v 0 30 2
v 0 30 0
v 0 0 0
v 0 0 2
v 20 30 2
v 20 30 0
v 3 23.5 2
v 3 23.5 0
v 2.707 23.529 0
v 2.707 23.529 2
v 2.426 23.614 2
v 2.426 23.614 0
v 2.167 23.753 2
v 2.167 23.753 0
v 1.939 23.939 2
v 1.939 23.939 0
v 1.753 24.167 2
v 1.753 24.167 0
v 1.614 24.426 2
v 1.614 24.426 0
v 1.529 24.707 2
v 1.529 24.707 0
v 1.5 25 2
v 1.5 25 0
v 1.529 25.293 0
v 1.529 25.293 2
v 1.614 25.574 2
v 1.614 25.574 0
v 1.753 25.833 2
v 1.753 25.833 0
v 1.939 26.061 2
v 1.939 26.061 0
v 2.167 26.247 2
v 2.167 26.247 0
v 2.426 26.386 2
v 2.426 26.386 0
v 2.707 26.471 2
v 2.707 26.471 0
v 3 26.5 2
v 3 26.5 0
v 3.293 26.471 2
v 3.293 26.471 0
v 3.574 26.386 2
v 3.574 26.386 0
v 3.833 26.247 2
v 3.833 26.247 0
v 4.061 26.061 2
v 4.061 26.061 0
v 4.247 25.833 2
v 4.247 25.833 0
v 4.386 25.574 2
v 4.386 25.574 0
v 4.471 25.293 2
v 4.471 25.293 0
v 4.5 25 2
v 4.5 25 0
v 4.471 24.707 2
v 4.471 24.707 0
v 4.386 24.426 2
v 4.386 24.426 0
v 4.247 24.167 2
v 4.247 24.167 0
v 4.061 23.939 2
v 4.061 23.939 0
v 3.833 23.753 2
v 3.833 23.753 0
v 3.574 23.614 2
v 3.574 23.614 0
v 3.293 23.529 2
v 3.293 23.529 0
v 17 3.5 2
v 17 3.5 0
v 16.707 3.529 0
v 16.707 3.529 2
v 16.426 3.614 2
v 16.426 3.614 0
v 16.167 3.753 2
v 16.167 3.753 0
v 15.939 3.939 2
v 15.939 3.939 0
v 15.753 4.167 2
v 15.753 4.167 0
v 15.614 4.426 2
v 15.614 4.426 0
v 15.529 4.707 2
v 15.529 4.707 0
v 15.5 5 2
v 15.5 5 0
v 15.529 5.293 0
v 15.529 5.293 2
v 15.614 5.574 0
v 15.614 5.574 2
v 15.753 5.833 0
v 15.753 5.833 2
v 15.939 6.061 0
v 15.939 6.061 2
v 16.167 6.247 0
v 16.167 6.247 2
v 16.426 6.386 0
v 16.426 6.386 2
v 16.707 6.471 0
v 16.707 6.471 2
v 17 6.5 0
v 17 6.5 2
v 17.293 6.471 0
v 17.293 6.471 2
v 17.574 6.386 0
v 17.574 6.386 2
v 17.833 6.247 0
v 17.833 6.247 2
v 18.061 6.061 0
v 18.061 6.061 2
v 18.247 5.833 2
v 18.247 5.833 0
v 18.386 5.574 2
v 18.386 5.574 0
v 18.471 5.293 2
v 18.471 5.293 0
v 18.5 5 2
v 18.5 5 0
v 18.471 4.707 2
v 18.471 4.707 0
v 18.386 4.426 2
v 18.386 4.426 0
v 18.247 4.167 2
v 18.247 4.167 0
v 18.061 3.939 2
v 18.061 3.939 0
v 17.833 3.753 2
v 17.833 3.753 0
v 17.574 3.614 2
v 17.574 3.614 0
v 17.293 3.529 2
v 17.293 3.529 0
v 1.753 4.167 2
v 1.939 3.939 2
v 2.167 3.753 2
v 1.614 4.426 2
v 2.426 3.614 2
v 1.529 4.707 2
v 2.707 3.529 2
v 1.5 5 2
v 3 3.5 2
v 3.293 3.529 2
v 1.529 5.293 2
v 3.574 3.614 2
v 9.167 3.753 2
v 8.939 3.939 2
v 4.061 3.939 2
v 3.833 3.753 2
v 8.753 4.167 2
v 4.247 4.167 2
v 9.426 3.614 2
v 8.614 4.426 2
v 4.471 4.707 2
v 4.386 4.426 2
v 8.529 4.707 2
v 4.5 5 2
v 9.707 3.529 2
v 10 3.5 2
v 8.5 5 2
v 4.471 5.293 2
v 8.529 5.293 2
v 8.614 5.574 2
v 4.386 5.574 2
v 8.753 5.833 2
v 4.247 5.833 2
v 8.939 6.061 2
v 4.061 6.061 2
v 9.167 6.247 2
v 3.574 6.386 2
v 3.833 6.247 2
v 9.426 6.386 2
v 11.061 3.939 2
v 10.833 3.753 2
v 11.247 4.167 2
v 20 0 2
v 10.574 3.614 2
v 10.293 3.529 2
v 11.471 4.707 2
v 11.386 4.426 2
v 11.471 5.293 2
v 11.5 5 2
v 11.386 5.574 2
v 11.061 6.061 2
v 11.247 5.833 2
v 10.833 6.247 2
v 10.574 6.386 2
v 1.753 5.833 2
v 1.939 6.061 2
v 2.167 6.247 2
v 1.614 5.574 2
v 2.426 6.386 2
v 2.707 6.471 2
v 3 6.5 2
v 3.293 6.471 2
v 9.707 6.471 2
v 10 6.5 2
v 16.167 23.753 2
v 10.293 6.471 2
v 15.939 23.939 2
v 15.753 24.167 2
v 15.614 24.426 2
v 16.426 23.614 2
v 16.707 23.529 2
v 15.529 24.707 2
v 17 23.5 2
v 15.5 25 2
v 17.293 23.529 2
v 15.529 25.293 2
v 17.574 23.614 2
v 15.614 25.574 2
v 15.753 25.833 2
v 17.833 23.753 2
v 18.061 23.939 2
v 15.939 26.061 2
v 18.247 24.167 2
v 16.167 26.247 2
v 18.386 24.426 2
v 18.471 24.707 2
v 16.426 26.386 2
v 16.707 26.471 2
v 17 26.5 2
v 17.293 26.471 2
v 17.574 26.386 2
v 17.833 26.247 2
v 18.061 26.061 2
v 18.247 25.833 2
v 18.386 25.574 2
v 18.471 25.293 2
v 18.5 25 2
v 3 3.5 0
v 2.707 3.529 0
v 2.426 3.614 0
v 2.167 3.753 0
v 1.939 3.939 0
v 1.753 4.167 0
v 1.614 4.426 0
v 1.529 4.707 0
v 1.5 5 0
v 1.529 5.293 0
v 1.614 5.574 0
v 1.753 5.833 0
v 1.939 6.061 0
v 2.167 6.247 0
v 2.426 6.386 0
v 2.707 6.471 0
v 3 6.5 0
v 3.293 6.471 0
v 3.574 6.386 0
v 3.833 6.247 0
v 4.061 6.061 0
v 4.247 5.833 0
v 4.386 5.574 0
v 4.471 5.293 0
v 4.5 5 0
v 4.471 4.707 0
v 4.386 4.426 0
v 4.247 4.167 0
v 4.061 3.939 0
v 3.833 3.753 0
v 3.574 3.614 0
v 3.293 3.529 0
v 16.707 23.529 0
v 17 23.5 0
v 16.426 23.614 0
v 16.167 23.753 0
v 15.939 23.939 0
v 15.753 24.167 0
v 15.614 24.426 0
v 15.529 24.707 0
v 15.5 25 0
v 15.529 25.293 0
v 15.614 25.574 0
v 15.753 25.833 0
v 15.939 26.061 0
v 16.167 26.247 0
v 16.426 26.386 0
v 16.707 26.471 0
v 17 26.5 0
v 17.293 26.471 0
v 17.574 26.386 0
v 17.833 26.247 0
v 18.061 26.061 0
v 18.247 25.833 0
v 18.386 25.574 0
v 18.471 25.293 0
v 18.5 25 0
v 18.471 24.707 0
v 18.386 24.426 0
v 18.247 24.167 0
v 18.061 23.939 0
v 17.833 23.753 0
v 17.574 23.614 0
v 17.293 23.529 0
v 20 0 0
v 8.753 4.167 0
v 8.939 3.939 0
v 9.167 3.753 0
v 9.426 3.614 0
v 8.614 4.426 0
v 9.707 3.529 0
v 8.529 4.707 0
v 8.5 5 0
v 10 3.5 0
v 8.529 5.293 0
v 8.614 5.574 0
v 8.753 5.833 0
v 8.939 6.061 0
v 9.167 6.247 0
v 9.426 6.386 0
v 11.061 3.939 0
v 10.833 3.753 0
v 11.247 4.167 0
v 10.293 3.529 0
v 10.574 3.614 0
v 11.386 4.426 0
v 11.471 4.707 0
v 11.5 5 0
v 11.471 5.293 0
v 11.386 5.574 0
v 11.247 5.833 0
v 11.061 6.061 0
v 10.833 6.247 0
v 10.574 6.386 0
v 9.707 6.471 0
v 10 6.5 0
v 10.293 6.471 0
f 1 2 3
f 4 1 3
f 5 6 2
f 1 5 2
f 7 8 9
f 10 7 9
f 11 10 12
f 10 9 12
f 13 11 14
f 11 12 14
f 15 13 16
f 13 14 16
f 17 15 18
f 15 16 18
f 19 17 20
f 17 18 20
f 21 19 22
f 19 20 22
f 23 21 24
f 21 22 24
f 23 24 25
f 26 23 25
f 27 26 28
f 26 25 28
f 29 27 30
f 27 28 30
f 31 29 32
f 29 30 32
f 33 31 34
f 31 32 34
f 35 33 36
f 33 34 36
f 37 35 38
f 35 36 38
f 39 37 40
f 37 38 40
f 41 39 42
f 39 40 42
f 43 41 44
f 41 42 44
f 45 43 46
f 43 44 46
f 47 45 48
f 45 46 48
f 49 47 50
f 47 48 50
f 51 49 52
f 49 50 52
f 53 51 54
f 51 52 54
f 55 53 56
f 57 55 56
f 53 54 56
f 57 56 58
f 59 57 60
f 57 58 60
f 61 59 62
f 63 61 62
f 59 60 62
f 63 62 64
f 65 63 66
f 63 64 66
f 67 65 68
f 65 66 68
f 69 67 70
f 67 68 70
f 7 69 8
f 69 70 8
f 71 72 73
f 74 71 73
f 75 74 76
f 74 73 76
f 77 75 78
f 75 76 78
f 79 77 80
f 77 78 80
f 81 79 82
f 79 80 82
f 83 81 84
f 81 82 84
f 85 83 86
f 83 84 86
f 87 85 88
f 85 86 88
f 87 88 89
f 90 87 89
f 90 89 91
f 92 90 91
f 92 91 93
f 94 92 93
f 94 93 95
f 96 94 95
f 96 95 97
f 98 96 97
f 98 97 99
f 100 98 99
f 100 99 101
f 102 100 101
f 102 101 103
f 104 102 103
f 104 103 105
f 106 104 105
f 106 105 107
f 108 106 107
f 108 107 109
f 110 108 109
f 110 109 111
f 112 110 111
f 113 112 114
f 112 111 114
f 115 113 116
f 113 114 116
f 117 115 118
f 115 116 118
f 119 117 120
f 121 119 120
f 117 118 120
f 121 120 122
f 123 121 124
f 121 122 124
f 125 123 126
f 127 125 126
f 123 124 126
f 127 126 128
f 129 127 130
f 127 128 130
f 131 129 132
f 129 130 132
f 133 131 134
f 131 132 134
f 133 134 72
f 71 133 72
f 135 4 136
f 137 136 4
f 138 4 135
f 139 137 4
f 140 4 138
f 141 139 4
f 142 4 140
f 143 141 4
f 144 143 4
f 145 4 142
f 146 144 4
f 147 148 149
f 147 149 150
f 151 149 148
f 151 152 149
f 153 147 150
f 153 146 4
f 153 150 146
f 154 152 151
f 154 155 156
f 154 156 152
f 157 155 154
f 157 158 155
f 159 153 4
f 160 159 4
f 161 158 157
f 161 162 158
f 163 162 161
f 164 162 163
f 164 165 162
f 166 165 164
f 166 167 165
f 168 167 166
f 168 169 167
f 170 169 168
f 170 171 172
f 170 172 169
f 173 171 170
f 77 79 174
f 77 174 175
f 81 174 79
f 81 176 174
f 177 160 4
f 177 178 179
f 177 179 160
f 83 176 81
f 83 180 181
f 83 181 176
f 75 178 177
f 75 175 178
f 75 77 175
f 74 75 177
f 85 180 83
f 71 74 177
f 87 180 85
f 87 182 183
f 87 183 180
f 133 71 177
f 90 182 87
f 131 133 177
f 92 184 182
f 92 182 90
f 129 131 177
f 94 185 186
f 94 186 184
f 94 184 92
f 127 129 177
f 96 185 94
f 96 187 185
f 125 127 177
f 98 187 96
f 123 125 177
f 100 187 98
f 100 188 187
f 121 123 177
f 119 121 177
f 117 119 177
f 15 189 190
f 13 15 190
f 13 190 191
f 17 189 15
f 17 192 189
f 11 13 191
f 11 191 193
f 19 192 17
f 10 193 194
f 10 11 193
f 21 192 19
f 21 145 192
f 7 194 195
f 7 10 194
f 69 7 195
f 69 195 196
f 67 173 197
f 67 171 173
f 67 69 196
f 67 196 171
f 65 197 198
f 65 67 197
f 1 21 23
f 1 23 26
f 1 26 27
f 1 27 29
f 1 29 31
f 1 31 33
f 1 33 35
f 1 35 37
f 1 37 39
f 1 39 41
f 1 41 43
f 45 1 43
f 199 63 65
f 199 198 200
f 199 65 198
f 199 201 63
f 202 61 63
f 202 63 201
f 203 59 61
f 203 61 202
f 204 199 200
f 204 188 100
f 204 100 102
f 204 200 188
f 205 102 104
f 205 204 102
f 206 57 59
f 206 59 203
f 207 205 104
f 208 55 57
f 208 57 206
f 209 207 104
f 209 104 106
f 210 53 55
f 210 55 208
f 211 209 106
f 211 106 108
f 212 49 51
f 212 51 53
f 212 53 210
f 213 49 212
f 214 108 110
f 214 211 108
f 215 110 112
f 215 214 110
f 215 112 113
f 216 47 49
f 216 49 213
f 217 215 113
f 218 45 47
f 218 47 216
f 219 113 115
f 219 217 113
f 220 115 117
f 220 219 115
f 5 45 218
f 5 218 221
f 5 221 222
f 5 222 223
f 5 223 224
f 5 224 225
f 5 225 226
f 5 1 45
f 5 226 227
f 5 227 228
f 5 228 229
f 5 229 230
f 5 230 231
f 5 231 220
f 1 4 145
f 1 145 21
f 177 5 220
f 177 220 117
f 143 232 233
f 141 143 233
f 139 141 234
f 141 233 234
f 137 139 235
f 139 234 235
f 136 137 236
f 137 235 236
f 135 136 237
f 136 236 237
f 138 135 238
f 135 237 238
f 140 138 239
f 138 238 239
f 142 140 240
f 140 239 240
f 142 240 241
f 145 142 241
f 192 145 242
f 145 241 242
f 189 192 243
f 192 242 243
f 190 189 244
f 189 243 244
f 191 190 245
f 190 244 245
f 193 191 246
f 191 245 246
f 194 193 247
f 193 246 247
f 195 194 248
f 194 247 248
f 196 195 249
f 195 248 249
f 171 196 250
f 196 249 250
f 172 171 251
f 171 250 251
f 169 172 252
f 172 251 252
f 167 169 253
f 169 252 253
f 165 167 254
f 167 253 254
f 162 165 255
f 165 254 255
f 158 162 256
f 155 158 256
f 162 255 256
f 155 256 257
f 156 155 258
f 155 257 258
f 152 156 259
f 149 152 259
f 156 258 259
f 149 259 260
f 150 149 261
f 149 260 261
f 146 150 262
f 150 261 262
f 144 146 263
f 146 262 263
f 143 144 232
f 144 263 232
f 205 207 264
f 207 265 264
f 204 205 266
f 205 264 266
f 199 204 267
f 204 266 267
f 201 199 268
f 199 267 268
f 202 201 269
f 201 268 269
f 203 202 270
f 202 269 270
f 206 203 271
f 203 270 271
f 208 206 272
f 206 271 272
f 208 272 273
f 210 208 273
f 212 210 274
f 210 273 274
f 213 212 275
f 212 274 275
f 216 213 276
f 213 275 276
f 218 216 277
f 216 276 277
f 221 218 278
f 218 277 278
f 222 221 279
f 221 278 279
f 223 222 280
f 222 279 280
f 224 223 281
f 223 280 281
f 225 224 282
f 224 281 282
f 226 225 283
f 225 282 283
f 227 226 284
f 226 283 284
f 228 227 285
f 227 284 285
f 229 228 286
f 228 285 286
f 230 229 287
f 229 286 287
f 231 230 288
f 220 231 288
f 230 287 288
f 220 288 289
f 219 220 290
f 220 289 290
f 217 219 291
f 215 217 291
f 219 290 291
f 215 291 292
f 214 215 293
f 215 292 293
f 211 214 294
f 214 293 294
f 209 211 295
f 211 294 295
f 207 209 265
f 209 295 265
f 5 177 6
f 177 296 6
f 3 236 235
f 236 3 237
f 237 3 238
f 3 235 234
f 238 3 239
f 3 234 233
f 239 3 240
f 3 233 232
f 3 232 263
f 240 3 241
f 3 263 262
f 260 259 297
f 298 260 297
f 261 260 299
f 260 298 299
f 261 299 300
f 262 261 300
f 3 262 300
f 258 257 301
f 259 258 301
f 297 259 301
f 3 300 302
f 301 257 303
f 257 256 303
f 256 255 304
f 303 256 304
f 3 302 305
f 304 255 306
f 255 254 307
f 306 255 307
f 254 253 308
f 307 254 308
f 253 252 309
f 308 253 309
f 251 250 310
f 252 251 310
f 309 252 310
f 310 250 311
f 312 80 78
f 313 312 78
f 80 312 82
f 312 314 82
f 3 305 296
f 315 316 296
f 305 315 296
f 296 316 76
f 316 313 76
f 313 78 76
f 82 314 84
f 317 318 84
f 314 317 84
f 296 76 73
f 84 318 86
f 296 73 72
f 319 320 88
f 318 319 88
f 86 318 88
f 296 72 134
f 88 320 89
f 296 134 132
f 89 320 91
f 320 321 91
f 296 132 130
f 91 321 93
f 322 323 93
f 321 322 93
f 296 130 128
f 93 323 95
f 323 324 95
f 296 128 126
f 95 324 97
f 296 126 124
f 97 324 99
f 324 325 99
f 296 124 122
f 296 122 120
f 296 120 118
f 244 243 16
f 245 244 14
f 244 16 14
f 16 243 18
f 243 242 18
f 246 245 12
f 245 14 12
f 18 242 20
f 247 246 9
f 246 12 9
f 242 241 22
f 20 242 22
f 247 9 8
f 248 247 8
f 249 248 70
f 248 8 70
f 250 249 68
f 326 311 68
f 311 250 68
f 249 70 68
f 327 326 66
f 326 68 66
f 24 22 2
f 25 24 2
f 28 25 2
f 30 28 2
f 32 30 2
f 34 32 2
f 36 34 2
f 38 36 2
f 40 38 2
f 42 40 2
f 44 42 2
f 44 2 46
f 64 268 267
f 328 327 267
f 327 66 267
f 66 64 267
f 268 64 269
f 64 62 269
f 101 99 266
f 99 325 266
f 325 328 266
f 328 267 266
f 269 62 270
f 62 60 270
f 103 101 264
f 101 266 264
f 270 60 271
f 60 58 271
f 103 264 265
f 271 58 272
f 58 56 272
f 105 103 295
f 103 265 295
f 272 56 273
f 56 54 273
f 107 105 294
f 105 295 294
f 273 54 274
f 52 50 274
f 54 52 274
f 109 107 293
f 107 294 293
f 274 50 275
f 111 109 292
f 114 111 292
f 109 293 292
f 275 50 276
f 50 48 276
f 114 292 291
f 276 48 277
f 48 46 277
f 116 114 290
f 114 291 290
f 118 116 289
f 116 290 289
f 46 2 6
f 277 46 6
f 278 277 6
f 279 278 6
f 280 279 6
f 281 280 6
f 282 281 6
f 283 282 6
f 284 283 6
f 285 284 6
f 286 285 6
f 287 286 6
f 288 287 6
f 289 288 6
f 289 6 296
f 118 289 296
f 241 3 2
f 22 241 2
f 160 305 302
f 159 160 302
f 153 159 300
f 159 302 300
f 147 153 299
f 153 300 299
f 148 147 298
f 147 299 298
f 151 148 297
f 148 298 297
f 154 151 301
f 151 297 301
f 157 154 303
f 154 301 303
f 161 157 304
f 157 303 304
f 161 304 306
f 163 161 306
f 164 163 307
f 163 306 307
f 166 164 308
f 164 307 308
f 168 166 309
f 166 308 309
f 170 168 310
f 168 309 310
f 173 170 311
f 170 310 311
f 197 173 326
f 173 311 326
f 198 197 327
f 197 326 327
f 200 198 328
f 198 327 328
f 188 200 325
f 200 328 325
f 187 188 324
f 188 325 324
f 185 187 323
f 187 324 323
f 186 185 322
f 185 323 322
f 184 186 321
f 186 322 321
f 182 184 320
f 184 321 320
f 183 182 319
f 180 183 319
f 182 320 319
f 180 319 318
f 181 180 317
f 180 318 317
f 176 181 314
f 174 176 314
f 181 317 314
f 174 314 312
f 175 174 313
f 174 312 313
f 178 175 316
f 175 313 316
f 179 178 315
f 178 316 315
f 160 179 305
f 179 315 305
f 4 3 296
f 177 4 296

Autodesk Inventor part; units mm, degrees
ref_plane "YZ Plane" through (0, 0, 0) normal (1, 0, 0) x (0, 1, 0)
ref_plane "XZ Plane" through (0, 0, 0) normal (0, 1, 0) x (-1, 0, 0)
ref_plane "XY Plane" through (0, 0, 0) normal (0, 0, 1) x (1, 0, 0)
sketch "スケッチ1" plane through (0, 0, 0) normal (0, 0, 1) x (1, 0, 0)
  line L0 (0, 0) -> (20, 0)
  line L1 (20, 0) -> (20, 30)
  line L2 (20, 30) -> (0, 30)
  line L3 (0, 30) -> (0, 0)
  dimension "d0" = 30
  dimension "d1" = 20
extrude "押し出し1" add sketch "スケッチ1" along normal blind 2
sketch "スケッチ4" plane through (0, 0, 2) normal (0, 0, 1) x (1, 0, 0)
  line L0 (20, 30) -> (0, 30) projected
  line L1 (10, 30) -> (10, 0)
  line L2 (0, 0) -> (20, 0) projected
  point P0 (3, 5)
  point P1 (3, 25)
  point P2 (17, 5)
  point P3 (17, 25)
  dimension "d23" = 7
  dimension "d24" = 7
  dimension "d25" = 20
  dimension "d26" = 5
hole "穴3" at (3, 5, 2) at (3, 25, 2) at (17, 25, 2) at (17, 5, 2) direction (0, 0, -1) diameter 3 end through all
sketch "スケッチ5" plane through (0, 0, 2) normal (0, 0, 1) x (1, 0, 0)
  line L0 (0, 0) -> (20, 0) projected
  point P0 (10, 5)
  dimension "d34" = 5
hole "穴4" at (10, 5, 2) direction (0, 0, -1) diameter 3 end through all
properties part number "指支え"
